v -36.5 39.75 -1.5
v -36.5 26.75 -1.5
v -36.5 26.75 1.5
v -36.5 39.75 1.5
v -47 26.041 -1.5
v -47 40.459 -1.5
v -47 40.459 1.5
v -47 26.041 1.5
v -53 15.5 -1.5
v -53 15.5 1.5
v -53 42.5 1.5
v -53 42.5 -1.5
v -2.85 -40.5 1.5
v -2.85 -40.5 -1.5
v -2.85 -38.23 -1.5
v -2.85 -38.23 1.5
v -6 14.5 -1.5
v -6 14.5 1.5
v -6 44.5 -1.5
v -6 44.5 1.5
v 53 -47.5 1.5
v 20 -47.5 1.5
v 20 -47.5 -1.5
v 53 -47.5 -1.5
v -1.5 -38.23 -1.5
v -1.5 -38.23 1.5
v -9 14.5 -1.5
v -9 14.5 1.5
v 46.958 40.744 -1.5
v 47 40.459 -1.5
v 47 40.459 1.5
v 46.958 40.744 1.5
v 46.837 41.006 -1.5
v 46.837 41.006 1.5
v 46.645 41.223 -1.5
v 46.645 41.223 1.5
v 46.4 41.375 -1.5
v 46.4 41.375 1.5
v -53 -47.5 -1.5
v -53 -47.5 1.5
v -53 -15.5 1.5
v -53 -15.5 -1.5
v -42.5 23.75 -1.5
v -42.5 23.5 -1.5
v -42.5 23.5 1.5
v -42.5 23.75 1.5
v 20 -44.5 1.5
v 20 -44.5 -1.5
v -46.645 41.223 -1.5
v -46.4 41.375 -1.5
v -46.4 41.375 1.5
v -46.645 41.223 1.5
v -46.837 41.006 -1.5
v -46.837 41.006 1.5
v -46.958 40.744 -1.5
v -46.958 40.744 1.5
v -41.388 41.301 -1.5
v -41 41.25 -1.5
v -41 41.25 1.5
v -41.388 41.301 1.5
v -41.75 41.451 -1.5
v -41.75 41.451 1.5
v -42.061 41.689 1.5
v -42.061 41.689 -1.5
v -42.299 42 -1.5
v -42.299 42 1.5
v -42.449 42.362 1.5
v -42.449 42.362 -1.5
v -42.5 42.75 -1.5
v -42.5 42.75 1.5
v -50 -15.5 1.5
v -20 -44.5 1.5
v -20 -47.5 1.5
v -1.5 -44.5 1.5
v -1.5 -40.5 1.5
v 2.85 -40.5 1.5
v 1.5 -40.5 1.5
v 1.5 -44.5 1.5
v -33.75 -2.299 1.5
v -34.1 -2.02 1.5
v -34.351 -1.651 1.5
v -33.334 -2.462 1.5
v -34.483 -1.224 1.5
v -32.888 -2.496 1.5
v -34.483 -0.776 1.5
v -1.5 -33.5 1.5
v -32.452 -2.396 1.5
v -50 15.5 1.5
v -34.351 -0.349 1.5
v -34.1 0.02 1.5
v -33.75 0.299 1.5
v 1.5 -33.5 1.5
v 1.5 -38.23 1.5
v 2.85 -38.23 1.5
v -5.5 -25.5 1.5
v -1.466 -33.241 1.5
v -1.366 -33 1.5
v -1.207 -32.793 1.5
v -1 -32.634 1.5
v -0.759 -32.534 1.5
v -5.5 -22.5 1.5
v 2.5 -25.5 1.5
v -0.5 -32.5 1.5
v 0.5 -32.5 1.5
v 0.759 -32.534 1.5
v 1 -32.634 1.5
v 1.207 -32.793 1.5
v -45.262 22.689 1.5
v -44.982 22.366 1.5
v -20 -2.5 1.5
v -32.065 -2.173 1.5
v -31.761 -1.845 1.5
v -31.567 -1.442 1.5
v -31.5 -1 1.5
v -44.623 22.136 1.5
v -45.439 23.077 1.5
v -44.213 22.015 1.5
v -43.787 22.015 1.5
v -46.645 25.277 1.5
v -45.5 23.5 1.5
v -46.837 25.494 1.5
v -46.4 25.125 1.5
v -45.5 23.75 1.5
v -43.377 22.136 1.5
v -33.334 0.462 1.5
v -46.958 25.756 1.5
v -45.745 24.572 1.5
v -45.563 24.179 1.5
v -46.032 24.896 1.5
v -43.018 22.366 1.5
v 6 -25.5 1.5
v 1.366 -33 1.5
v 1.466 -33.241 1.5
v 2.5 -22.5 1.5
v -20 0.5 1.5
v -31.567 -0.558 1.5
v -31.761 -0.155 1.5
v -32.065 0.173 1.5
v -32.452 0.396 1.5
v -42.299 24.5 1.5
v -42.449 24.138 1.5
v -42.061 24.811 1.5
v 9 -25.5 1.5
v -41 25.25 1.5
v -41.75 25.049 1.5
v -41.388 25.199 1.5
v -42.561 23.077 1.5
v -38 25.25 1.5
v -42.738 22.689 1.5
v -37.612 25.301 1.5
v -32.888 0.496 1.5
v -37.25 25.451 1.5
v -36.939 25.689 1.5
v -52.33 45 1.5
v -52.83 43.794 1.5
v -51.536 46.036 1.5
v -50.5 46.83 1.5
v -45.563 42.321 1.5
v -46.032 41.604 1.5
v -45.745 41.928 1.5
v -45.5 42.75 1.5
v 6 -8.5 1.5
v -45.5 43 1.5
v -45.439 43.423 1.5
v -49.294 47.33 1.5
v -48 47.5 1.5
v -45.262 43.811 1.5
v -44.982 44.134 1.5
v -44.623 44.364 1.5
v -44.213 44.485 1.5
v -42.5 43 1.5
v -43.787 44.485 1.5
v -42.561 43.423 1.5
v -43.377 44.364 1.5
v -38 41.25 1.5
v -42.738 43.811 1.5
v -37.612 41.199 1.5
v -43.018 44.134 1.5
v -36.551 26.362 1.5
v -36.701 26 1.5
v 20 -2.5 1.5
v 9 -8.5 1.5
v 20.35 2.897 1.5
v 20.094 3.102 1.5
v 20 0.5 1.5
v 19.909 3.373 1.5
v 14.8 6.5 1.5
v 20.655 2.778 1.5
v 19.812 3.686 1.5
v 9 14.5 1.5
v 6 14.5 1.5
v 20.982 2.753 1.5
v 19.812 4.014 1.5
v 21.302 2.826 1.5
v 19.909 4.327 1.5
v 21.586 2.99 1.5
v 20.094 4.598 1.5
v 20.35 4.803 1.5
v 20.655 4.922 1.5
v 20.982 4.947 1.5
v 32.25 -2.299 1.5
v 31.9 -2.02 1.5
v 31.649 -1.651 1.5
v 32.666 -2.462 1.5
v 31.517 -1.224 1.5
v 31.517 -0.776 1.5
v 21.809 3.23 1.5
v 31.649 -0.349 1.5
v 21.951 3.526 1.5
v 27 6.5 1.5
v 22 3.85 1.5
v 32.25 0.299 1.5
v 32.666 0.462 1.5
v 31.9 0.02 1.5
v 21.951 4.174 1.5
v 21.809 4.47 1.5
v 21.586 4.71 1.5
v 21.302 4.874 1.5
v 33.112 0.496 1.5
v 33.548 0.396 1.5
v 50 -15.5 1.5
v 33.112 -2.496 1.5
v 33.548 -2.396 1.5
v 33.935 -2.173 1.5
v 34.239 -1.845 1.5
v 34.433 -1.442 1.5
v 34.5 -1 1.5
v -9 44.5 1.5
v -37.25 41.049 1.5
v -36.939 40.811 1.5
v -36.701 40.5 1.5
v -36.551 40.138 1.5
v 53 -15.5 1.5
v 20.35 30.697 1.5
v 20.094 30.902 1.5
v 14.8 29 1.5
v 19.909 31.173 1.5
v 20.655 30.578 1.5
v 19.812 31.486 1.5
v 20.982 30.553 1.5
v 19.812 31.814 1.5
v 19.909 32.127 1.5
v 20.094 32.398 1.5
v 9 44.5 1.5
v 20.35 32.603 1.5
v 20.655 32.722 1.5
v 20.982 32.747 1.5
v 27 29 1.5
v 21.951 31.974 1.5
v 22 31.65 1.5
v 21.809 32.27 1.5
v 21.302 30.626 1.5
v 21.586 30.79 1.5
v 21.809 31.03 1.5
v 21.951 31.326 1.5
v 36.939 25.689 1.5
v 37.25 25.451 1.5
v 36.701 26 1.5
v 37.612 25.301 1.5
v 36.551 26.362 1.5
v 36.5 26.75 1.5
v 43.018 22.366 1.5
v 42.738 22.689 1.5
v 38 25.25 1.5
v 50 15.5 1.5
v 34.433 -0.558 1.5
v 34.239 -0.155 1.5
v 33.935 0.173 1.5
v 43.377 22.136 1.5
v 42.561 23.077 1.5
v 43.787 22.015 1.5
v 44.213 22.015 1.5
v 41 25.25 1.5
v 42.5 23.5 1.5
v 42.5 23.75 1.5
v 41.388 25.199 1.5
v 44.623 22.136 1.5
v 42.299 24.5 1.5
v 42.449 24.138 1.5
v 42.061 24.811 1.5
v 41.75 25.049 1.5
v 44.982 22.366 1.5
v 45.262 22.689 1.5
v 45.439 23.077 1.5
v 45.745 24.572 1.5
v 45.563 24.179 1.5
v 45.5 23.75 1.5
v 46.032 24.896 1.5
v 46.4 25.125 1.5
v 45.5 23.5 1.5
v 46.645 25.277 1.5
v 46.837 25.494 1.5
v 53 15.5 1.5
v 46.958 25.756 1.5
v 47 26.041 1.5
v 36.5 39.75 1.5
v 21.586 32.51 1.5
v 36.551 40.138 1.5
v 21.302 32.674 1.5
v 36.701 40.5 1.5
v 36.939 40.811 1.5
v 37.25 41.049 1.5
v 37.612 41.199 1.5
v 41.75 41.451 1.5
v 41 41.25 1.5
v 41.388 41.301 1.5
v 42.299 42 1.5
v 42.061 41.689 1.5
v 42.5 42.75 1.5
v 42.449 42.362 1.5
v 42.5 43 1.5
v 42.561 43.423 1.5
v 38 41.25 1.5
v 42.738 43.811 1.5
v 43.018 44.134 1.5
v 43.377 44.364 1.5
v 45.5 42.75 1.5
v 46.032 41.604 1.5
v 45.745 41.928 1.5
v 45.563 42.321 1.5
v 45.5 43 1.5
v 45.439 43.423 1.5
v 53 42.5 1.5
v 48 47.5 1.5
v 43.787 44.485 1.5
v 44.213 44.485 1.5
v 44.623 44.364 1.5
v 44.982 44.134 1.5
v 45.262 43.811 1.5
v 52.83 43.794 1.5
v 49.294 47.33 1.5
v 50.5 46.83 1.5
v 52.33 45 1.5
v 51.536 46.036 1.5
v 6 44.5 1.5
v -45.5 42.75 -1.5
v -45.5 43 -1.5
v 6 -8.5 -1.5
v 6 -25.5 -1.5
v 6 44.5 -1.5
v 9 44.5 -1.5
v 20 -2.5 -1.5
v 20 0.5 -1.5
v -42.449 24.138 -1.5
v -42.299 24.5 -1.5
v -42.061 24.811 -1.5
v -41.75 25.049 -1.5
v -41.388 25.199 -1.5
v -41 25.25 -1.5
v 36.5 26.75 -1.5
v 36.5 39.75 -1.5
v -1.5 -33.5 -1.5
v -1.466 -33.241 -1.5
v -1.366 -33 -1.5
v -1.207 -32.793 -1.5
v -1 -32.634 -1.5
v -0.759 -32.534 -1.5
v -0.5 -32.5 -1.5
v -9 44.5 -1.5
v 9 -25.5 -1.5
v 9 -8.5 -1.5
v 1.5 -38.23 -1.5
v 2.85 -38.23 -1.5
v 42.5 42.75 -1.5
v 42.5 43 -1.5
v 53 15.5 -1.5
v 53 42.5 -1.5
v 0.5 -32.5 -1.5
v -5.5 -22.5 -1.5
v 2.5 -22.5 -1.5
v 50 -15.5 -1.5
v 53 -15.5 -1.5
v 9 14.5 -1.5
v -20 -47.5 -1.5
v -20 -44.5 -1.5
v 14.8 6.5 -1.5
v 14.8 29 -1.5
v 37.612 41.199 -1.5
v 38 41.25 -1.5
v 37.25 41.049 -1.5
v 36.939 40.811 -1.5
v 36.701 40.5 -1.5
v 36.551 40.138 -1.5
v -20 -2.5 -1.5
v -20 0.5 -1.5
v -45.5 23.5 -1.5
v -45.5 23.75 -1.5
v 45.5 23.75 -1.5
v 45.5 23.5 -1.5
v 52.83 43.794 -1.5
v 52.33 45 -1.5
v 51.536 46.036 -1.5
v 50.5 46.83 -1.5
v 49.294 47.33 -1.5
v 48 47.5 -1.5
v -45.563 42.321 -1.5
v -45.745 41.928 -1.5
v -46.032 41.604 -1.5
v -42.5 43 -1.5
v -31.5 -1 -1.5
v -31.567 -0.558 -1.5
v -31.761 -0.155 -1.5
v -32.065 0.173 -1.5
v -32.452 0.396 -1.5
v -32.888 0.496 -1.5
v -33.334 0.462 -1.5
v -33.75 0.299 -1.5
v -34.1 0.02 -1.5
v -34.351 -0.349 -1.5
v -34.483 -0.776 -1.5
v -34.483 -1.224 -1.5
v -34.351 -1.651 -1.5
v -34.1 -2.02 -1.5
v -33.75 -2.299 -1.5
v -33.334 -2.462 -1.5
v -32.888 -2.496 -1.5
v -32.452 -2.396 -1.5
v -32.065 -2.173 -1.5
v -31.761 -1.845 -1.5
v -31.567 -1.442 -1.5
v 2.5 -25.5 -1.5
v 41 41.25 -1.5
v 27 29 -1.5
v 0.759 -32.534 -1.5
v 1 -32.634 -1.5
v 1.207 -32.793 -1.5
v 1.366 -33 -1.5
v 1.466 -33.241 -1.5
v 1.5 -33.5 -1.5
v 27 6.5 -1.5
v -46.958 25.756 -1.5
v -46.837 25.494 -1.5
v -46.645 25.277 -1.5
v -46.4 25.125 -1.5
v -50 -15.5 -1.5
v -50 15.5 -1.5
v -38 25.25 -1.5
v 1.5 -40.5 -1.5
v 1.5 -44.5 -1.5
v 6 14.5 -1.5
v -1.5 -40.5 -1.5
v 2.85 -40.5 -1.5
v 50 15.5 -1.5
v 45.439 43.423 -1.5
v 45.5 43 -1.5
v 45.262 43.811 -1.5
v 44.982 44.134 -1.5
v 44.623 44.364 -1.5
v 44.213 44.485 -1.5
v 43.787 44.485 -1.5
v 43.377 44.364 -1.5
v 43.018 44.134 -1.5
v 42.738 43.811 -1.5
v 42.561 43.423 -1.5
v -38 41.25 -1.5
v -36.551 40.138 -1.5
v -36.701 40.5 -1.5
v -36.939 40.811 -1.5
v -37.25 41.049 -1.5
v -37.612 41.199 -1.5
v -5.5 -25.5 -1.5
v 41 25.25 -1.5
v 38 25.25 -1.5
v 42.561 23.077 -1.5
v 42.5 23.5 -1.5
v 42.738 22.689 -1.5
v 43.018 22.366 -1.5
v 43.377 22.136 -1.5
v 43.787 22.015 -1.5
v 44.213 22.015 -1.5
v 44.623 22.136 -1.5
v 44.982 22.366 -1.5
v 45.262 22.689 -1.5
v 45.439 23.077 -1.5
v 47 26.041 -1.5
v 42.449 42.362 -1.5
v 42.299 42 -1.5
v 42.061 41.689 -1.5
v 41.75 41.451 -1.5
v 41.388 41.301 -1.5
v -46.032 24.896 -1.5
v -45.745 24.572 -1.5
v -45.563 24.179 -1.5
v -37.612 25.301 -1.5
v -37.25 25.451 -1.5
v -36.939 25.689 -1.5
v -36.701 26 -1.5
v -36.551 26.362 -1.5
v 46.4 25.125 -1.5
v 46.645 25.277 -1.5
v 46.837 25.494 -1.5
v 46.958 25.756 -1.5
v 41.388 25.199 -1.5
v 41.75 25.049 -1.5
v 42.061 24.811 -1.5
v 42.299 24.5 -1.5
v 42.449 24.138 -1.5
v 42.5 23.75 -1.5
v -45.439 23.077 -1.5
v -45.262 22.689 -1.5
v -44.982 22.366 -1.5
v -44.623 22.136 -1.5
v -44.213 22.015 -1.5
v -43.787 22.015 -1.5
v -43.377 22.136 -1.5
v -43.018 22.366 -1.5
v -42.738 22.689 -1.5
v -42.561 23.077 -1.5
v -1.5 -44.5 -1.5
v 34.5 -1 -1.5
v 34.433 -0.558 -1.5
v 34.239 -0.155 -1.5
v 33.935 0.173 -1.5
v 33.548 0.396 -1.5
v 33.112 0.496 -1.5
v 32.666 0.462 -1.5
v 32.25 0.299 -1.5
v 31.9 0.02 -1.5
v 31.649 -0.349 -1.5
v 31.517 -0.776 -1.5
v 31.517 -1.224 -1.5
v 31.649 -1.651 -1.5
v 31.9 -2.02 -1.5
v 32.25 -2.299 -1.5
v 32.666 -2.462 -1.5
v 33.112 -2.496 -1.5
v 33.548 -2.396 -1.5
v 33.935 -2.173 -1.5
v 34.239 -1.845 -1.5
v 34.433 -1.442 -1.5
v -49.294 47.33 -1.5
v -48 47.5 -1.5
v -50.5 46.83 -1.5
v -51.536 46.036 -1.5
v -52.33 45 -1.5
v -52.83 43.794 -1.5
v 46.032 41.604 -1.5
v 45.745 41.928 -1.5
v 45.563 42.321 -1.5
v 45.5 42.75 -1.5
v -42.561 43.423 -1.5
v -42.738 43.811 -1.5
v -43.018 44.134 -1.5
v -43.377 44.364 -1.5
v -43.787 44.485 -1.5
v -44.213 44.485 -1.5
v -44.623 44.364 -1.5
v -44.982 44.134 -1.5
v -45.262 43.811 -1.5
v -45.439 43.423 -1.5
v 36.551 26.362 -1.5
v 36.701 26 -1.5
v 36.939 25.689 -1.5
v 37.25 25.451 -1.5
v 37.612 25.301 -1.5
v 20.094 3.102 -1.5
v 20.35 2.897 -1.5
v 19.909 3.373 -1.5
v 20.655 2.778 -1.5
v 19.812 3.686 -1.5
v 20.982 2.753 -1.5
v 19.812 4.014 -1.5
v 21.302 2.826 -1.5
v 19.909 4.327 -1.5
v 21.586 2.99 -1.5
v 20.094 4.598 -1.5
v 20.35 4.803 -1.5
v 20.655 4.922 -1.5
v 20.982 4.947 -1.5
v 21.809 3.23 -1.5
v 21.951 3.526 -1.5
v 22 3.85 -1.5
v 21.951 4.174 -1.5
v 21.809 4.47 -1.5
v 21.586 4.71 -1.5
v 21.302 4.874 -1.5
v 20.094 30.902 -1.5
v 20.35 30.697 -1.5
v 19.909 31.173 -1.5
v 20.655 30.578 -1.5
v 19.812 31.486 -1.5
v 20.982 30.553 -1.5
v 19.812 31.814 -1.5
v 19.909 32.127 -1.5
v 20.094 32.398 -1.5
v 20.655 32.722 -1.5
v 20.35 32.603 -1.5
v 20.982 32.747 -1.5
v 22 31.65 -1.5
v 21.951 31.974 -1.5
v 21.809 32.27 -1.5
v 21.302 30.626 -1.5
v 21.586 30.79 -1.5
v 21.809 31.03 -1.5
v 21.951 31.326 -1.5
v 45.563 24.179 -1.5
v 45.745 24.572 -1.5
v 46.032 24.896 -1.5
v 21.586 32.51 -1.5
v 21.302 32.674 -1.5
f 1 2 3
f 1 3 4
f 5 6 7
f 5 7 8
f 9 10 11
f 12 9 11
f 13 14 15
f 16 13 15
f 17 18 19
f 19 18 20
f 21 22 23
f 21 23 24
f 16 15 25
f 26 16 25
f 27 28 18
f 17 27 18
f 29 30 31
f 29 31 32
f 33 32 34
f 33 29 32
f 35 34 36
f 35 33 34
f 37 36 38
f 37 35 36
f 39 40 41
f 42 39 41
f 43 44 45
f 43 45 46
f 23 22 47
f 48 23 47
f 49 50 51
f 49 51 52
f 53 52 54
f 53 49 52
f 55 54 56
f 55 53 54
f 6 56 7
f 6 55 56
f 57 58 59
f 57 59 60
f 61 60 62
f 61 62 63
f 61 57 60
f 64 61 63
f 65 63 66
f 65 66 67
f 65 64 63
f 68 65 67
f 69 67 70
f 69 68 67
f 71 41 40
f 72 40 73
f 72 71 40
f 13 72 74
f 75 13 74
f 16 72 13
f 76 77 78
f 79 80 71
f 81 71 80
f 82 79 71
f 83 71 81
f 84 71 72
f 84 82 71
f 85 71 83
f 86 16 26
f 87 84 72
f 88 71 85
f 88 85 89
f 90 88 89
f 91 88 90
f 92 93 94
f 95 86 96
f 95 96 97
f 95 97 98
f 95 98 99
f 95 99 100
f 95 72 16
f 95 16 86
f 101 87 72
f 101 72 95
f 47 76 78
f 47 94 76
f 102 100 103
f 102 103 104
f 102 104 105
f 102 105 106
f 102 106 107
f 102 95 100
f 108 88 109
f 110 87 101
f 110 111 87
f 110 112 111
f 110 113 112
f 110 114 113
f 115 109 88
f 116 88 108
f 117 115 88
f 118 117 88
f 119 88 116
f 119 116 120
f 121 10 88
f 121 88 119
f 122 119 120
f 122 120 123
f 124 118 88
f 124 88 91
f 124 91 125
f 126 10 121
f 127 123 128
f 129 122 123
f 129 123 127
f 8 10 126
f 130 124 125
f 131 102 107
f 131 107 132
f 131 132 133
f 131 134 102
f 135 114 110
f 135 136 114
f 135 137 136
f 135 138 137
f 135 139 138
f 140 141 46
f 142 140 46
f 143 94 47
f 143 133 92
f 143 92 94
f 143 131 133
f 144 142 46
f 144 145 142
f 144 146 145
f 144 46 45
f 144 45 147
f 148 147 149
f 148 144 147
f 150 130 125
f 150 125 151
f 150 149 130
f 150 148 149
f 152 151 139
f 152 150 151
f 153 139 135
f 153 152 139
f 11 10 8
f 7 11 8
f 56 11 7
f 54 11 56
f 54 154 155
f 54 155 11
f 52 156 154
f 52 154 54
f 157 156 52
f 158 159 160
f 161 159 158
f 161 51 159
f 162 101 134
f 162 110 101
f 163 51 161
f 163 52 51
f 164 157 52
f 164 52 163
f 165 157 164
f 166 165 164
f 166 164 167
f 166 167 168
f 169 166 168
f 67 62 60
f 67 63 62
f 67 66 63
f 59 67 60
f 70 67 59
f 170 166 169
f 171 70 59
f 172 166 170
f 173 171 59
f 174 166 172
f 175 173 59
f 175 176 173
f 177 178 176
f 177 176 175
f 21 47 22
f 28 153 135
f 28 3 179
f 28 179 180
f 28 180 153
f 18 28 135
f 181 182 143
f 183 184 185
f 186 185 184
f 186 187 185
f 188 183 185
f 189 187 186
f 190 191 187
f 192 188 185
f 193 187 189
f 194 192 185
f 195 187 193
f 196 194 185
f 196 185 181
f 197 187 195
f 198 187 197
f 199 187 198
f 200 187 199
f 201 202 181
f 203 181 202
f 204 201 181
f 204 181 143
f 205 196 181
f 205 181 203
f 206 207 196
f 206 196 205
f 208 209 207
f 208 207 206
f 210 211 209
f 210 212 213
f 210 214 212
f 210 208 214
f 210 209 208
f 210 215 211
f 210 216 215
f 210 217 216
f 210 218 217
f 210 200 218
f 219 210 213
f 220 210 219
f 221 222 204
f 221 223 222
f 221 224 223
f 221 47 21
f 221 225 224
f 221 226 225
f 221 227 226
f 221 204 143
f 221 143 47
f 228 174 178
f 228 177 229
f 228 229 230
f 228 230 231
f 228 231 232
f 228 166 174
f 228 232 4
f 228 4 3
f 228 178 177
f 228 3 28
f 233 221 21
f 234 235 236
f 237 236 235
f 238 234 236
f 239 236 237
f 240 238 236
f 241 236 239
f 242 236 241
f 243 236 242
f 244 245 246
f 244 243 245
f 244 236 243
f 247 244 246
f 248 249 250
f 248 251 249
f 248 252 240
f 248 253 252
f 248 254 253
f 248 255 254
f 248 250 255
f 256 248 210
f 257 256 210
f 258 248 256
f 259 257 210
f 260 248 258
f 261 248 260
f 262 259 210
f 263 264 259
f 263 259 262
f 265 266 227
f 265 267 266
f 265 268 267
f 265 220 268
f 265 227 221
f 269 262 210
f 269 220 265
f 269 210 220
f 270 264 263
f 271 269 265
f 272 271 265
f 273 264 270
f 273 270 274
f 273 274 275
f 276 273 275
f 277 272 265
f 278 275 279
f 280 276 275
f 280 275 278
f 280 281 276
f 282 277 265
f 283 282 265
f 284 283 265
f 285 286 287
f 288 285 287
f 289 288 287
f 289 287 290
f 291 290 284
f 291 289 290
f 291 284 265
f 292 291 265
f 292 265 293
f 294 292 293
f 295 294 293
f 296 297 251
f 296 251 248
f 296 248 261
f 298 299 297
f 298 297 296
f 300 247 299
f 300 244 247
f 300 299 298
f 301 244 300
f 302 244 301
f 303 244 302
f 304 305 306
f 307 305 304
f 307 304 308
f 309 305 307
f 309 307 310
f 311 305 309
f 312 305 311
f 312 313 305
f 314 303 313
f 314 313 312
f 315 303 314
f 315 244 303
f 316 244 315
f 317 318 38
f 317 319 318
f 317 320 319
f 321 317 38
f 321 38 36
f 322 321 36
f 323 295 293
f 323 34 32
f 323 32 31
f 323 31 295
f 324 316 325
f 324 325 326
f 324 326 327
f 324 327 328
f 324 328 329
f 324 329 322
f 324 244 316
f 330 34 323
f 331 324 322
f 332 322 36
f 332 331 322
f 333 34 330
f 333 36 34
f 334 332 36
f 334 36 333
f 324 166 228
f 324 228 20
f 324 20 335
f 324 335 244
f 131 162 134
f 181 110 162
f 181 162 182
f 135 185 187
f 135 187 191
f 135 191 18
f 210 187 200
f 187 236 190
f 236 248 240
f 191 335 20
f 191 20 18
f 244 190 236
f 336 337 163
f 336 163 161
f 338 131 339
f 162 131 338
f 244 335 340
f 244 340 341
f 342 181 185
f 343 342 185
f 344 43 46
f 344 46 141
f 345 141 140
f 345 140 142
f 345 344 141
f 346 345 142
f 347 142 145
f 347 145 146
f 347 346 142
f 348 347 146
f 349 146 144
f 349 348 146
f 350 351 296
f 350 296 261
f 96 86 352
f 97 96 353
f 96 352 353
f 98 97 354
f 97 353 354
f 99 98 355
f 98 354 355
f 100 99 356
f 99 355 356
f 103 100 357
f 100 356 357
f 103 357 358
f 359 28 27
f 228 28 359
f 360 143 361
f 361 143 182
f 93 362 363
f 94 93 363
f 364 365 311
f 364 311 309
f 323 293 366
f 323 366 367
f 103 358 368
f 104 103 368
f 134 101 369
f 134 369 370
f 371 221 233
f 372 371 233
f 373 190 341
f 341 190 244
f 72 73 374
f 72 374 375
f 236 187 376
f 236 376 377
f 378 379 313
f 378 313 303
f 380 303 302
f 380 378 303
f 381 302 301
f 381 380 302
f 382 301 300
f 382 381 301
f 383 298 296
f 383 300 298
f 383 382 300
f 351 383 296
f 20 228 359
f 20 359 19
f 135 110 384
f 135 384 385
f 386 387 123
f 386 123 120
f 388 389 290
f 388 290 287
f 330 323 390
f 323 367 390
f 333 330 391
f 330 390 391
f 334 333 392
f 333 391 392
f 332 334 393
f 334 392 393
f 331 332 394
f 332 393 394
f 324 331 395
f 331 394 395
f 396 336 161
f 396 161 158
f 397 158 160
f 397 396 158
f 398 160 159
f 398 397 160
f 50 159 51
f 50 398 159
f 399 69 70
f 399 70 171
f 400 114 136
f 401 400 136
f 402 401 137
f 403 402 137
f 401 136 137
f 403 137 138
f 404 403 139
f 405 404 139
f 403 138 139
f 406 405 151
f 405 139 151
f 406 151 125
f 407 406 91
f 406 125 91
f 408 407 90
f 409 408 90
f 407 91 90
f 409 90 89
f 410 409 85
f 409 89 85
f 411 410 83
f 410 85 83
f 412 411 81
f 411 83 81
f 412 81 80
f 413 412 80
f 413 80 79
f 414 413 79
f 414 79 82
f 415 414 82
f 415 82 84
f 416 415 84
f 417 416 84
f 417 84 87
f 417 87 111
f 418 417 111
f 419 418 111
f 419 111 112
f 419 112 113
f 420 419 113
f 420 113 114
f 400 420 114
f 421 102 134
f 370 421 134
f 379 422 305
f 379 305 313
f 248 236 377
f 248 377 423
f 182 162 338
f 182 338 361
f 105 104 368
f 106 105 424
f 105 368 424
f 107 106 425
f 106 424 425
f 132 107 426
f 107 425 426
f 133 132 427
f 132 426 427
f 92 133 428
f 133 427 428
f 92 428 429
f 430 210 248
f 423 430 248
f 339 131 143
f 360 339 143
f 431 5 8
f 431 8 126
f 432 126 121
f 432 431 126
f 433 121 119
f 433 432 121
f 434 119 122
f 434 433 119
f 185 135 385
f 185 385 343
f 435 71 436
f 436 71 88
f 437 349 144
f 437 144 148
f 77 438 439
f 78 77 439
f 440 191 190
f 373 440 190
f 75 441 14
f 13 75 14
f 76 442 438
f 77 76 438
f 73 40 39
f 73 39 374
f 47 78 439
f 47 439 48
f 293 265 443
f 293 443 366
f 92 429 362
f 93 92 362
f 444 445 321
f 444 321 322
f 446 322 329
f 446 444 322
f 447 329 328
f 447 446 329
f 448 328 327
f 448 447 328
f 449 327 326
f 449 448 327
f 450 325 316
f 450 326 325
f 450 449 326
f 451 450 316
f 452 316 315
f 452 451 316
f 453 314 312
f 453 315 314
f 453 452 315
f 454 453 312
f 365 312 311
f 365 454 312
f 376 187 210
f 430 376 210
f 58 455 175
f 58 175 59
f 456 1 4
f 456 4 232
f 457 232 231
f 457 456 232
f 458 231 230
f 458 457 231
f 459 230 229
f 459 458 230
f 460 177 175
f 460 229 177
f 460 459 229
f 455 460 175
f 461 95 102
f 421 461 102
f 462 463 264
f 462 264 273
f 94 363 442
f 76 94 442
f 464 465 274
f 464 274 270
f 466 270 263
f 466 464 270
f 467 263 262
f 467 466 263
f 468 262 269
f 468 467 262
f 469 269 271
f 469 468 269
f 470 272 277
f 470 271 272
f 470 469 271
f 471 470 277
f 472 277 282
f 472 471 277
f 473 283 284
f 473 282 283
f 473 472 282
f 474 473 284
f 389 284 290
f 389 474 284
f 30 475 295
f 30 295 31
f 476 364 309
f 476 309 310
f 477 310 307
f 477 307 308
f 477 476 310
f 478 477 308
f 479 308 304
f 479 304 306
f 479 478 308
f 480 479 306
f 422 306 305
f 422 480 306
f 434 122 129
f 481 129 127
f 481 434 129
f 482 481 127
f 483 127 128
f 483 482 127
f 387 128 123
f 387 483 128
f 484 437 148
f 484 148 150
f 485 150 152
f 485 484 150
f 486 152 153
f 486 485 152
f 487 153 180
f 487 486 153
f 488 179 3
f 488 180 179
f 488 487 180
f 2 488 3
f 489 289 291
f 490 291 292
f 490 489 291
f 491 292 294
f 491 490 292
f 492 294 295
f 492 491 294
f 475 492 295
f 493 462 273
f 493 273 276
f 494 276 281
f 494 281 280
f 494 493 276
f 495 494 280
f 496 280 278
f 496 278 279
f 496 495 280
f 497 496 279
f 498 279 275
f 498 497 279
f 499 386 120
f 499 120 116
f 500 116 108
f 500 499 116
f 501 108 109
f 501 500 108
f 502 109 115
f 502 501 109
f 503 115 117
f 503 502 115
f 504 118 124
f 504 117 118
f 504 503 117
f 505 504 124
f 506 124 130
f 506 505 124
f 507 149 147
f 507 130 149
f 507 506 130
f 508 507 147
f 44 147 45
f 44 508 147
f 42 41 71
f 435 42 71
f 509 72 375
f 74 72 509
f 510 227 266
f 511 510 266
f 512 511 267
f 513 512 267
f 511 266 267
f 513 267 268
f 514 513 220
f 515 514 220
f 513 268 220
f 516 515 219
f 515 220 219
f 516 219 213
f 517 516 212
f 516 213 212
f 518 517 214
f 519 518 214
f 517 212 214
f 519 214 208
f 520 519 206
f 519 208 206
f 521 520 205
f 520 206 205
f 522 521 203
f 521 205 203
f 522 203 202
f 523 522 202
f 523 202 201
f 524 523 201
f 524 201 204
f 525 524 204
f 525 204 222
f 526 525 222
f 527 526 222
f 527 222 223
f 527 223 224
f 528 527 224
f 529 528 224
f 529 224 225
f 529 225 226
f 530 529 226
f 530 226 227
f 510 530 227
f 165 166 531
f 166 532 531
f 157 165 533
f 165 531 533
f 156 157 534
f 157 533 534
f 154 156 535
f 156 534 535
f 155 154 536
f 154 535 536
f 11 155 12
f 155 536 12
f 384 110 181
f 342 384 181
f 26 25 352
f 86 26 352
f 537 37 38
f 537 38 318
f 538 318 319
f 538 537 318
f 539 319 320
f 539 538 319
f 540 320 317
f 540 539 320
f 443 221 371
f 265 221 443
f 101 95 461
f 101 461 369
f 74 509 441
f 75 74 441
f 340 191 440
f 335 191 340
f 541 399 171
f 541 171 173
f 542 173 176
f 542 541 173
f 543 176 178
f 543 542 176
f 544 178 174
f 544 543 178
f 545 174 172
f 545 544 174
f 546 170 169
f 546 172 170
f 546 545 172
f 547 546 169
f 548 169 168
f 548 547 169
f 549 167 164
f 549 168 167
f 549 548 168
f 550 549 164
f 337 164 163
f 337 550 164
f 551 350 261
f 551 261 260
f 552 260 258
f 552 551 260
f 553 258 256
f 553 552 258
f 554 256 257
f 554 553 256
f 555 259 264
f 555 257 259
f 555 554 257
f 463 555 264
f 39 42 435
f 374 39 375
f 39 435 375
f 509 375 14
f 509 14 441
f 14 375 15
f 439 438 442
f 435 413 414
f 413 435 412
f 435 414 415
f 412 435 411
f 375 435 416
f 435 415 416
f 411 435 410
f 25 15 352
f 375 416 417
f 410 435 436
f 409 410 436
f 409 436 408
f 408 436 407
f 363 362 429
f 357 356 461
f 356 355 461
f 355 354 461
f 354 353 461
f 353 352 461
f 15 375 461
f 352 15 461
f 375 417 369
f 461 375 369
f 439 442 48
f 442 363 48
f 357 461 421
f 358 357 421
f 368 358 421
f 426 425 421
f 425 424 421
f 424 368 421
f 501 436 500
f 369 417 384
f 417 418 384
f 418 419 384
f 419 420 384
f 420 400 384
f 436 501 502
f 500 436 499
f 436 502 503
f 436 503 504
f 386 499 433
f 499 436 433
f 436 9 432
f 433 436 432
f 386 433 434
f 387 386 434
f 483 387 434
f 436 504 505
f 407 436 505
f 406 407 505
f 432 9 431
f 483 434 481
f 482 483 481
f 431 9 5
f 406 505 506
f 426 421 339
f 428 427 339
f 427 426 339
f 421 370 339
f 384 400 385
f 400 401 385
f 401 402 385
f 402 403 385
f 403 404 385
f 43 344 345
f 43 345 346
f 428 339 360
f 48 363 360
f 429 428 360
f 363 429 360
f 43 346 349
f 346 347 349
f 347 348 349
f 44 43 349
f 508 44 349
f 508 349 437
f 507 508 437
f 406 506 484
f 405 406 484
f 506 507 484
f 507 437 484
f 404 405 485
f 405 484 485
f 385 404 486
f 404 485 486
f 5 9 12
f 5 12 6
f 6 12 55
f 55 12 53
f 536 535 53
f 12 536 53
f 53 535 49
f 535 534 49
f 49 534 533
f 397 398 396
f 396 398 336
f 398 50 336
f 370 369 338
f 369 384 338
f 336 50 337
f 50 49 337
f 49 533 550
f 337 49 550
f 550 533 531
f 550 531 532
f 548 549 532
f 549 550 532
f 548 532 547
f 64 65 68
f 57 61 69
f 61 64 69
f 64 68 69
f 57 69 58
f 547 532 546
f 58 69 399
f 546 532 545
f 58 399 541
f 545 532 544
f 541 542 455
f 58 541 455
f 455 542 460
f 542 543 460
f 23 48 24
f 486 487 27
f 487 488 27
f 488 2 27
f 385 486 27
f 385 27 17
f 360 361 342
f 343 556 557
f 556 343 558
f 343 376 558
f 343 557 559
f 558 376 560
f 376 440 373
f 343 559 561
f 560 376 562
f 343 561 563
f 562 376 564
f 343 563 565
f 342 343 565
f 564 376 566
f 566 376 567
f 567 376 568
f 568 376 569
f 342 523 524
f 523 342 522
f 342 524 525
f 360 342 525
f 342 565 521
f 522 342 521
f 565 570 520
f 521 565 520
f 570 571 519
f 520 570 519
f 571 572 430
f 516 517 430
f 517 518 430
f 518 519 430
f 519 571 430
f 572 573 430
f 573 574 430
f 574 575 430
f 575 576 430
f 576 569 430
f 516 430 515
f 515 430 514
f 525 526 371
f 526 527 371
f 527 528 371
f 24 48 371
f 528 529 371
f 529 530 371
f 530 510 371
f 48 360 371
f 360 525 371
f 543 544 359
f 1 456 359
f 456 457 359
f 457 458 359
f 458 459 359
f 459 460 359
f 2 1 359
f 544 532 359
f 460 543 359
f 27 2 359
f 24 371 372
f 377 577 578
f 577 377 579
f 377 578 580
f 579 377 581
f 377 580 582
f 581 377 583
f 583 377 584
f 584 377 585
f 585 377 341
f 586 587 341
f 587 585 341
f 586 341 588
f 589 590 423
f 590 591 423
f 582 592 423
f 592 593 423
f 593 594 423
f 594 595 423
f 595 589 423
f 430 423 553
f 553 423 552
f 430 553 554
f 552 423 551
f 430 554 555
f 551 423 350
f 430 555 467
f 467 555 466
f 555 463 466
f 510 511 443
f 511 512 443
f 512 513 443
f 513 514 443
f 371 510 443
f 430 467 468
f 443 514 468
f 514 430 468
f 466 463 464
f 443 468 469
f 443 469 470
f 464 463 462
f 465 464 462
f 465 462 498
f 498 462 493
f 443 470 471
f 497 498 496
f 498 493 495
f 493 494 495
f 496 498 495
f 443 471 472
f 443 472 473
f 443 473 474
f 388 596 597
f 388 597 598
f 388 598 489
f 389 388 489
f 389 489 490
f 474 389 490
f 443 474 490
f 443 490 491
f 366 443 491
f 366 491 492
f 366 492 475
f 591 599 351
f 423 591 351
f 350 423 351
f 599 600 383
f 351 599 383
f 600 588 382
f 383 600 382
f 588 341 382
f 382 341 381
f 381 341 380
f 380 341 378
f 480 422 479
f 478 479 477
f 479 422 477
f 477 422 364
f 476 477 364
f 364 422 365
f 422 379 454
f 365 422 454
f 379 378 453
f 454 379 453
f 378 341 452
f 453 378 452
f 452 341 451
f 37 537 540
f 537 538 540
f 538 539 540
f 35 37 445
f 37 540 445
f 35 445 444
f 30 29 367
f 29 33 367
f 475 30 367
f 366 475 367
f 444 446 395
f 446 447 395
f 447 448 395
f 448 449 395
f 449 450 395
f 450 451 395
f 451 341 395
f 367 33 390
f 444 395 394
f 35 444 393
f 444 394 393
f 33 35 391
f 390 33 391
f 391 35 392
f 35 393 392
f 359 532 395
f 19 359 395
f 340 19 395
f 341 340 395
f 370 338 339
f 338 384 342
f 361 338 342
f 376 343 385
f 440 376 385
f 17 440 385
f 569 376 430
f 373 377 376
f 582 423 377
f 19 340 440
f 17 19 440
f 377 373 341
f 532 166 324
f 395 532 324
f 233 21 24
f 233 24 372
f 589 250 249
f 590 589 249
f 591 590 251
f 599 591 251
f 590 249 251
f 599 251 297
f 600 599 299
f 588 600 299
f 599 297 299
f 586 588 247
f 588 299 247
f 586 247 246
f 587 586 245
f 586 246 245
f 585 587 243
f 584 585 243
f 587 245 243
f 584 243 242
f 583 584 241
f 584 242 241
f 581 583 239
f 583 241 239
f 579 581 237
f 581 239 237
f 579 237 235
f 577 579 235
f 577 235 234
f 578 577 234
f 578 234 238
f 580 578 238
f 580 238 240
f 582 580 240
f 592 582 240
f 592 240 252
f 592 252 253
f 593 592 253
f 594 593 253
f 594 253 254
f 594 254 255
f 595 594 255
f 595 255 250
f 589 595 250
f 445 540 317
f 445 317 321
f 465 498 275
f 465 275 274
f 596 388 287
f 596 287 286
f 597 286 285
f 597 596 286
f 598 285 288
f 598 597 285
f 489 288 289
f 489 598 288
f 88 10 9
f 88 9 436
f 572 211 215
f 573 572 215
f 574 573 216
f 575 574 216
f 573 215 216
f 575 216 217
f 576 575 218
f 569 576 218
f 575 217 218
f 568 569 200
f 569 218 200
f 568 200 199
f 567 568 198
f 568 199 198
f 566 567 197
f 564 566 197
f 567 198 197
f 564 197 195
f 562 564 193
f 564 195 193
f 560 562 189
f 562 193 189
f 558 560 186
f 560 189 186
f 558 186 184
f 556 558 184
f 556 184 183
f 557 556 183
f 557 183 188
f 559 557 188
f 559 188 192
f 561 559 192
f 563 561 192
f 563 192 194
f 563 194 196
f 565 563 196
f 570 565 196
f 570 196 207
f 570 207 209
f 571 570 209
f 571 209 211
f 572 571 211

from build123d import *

# Parameters (mm, degrees)
ESBO_O1_W                = 100
ESBO_O1_H                = 95
RESSALTO_EXTRUS_O1_DEPTH = 1.5
ESBO_O2_R                = 1.5
ESBO_O2_W                = 40
ESBO_O2_H                = 3
CORTE_EXTRUS_O1_DEPTH    = 4
ESBO_O3_W                = 3
ESBO_O3_H                = 32
RESSALTO_EXTRUS_O2_DEPTH = 3
CUT_EXTRUDE1_DEPTH       = 1
CUT_EXTRUDE1_DEPTH_BACK  = 4
CUT_EXTRUDE4_DEPTH       = 2.5
CUT_EXTRUDE4_DEPTH_BACK  = 2.5
FILLET1_R                = 5
SKETCH3_W                = 3
SKETCH3_H                = 30
SKETCH3_H_2              = 17
SKETCH3_W_2              = 8
SKETCH3_H_3              = 3
CUT_EXTRUDE5_DEPTH       = 2.5
CUT_EXTRUDE5_DEPTH_BACK  = 2.5
SKETCH4_R                = 1.1
SKETCH4_W                = 12.2
SKETCH4_H                = 22.5
CUT_EXTRUDE6_DEPTH       = 1
CUT_EXTRUDE6_DEPTH_BACK  = 4


with BuildPart() as part:
    # Esboço1 → Ressalto-extrusão1 (new body, symmetric)
    with BuildSketch(Plane.XY):
        Rectangle(ESBO_O1_W, ESBO_O1_H)
    extrude(amount=RESSALTO_EXTRUS_O1_DEPTH, both=True)

    # Esboço2 → Corte-extrusão1 (cut, through all)
    with BuildSketch(Plane.XY.offset(1.5)):
        with Locations((-33, -1)):
            Circle(ESBO_O2_R)
        with Locations((33, -1)):
            Circle(ESBO_O2_R)
        with Locations((0, -46)):
            Rectangle(ESBO_O2_W, ESBO_O2_H)
        with Locations((0, -1)):
            Rectangle(ESBO_O2_W, ESBO_O2_H)
    extrude(amount=-CORTE_EXTRUS_O1_DEPTH, mode=Mode.SUBTRACT)

    # Esboço3 → Ressalto-extrusão2 (add, through all)
    with BuildSketch(Plane.XY.offset(1.5)):
        with Locations((-51.5, -31.5)):
            Rectangle(ESBO_O3_W, ESBO_O3_H)
        with Locations((51.5, -31.5)):
            Rectangle(ESBO_O3_W, ESBO_O3_H)
        with Locations((-51.5, 31.5)):
            Rectangle(ESBO_O3_W, ESBO_O3_H)
        with Locations((51.5, 31.5)):
            Rectangle(ESBO_O3_W, ESBO_O3_H)
    extrude(amount=-RESSALTO_EXTRUS_O2_DEPTH)

    # Sketch1 → Cut-Extrude1 (cut, two sides)
    with BuildSketch(Plane(origin=(0, 0, -1.5), x_dir=(-1, 0, 0), z_dir=(0, 0, -1))) as cut_extrude1_sk:
        with BuildLine():
            Line((-36.5, 39.75), (-36.5, 26.75))
            ThreePointArc((-36.5, 26.75), (-36.939339828, 25.689339828), (-38, 25.25))
            Line((-38, 25.25), (-41, 25.25))
            ThreePointArc((-41, 25.25), (-42.060660172, 24.810660172), (-42.5, 23.75))
            Line((-42.5, 23.75), (-42.5, 23.5))
            ThreePointArc((-42.5, 23.5), (-44, 22), (-45.5, 23.5))
            Line((-45.5, 23.5), (-45.5, 23.75))
            ThreePointArc((-45.5, 23.75), (-45.74500996, 24.571583836), (-46.4, 25.124772708))
            ThreePointArc((-46.4, 25.124772708), (-46.836660027, 25.49356529), (-47, 26.041287847))
            Line((-47, 26.041287847), (-47, 40.458712153))
            ThreePointArc((-47, 40.458712153), (-46.836660027, 41.00643471), (-46.4, 41.375227292))
            ThreePointArc((-46.4, 41.375227292), (-45.74500996, 41.928416164), (-45.5, 42.75))
            Line((-45.5, 42.75), (-45.5, 43))
            ThreePointArc((-45.5, 43), (-44, 44.5), (-42.5, 43))
            Line((-42.5, 43), (-42.5, 42.75))
            ThreePointArc((-42.5, 42.75), (-42.060660172, 41.689339828), (-41, 41.25))
            Line((-41, 41.25), (-38, 41.25))
            ThreePointArc((-38, 41.25), (-36.939339828, 40.810660172), (-36.5, 39.75))
        make_face()
        with BuildLine():
            Line((47, 40.458712153), (47, 26.041287847))
            ThreePointArc((47, 26.041287847), (46.836660027, 25.49356529), (46.4, 25.124772708))
            ThreePointArc((46.4, 25.124772708), (45.74500996, 24.571583836), (45.5, 23.75))
            Line((45.5, 23.75), (45.5, 23.5))
            ThreePointArc((45.5, 23.5), (44, 22), (42.5, 23.5))
            Line((42.5, 23.5), (42.5, 23.75))
            ThreePointArc((42.5, 23.75), (42.060660172, 24.810660172), (41, 25.25))
            Line((41, 25.25), (38, 25.25))
            ThreePointArc((38, 25.25), (36.939339828, 25.689339828), (36.5, 26.75))
            Line((36.5, 26.75), (36.5, 39.75))
            ThreePointArc((36.5, 39.75), (36.939339828, 40.810660172), (38, 41.25))
            Line((38, 41.25), (41, 41.25))
            ThreePointArc((41, 41.25), (42.060660172, 41.689339828), (42.5, 42.75))
            Line((42.5, 42.75), (42.5, 43))
            ThreePointArc((42.5, 43), (44, 44.5), (45.5, 43))
            Line((45.5, 43), (45.5, 42.75))
            ThreePointArc((45.5, 42.75), (45.74500996, 41.928416164), (46.4, 41.375227292))
            ThreePointArc((46.4, 41.375227292), (46.836660027, 41.00643471), (47, 40.458712153))
        make_face()
    extrude(amount=CUT_EXTRUDE1_DEPTH, mode=Mode.SUBTRACT)
    extrude(cut_extrude1_sk.sketch, amount=-CUT_EXTRUDE1_DEPTH_BACK, mode=Mode.SUBTRACT)

    # Sketch2 → Cut-Extrude4 (cut, two sides)
    with BuildSketch(Plane.XY) as cut_extrude4_sk:
        with BuildLine():
            Line((-0.5, -32.5), (0.5, -32.5))
            ThreePointArc((0.5, -32.5), (1.207106781, -32.792893219), (1.5, -33.5))
            Line((1.5, -33.5), (1.5, -38.23))
            Line((1.5, -38.23), (2.85, -38.23))
            Line((2.85, -38.23), (2.85, -40.5))
            Line((2.85, -40.5), (1.5, -40.5))
            Line((1.5, -40.5), (1.5, -44.5))
            Line((1.5, -44.5), (-1.5, -44.5))
            Line((-1.5, -44.5), (-1.5, -40.5))
            Line((-1.5, -40.5), (-2.85, -40.5))
            Line((-2.85, -40.5), (-2.85, -38.23))
            Line((-2.85, -38.23), (-1.5, -38.23))
            Line((-1.5, -38.23), (-1.5, -33.5))
            ThreePointArc((-1.5, -33.5), (-1.207106781, -32.792893219), (-0.5, -32.5))
        make_face()
    extrude(amount=CUT_EXTRUDE4_DEPTH, mode=Mode.SUBTRACT)
    extrude(cut_extrude4_sk.sketch, amount=-CUT_EXTRUDE4_DEPTH_BACK, mode=Mode.SUBTRACT)

    # Fillet1
    fillet1_edges = [part.edges().sort_by_distance(p)[0] for p in [
        (53, 47.5, 0),
        (-53, 47.5, 0),
    ]]
    fillet(fillet1_edges, radius=FILLET1_R)

    # Sketch3 → Cut-Extrude5 (cut, two sides)
    with BuildSketch(Plane.XY) as cut_extrude5_sk:
        with Locations((7.5, 29.5)):
            Rectangle(SKETCH3_W, SKETCH3_H)
        with Locations((7.5, -17)):
            Rectangle(SKETCH3_W, SKETCH3_H_2)
        with Locations((-7.5, 29.5)):
            Rectangle(SKETCH3_W, SKETCH3_H)
        with Locations((-1.5, -24)):
            Rectangle(SKETCH3_W_2, SKETCH3_H_3)
    extrude(amount=CUT_EXTRUDE5_DEPTH, mode=Mode.SUBTRACT)
    extrude(cut_extrude5_sk.sketch, amount=-CUT_EXTRUDE5_DEPTH_BACK, mode=Mode.SUBTRACT)

    # Sketch4 → Cut-Extrude6 (cut, two sides)
    with BuildSketch(Plane.XY.offset(1.5)) as cut_extrude6_sk:
        with Locations((20.9, 31.65)):
            Circle(SKETCH4_R)
        with Locations((20.9, 3.85)):
            Circle(SKETCH4_R)
        with Locations((20.9, 17.75)):
            Rectangle(SKETCH4_W, SKETCH4_H)
    extrude(amount=CUT_EXTRUDE6_DEPTH, mode=Mode.SUBTRACT)
    extrude(cut_extrude6_sk.sketch, amount=-CUT_EXTRUDE6_DEPTH_BACK, mode=Mode.SUBTRACT)


solid = part.part
